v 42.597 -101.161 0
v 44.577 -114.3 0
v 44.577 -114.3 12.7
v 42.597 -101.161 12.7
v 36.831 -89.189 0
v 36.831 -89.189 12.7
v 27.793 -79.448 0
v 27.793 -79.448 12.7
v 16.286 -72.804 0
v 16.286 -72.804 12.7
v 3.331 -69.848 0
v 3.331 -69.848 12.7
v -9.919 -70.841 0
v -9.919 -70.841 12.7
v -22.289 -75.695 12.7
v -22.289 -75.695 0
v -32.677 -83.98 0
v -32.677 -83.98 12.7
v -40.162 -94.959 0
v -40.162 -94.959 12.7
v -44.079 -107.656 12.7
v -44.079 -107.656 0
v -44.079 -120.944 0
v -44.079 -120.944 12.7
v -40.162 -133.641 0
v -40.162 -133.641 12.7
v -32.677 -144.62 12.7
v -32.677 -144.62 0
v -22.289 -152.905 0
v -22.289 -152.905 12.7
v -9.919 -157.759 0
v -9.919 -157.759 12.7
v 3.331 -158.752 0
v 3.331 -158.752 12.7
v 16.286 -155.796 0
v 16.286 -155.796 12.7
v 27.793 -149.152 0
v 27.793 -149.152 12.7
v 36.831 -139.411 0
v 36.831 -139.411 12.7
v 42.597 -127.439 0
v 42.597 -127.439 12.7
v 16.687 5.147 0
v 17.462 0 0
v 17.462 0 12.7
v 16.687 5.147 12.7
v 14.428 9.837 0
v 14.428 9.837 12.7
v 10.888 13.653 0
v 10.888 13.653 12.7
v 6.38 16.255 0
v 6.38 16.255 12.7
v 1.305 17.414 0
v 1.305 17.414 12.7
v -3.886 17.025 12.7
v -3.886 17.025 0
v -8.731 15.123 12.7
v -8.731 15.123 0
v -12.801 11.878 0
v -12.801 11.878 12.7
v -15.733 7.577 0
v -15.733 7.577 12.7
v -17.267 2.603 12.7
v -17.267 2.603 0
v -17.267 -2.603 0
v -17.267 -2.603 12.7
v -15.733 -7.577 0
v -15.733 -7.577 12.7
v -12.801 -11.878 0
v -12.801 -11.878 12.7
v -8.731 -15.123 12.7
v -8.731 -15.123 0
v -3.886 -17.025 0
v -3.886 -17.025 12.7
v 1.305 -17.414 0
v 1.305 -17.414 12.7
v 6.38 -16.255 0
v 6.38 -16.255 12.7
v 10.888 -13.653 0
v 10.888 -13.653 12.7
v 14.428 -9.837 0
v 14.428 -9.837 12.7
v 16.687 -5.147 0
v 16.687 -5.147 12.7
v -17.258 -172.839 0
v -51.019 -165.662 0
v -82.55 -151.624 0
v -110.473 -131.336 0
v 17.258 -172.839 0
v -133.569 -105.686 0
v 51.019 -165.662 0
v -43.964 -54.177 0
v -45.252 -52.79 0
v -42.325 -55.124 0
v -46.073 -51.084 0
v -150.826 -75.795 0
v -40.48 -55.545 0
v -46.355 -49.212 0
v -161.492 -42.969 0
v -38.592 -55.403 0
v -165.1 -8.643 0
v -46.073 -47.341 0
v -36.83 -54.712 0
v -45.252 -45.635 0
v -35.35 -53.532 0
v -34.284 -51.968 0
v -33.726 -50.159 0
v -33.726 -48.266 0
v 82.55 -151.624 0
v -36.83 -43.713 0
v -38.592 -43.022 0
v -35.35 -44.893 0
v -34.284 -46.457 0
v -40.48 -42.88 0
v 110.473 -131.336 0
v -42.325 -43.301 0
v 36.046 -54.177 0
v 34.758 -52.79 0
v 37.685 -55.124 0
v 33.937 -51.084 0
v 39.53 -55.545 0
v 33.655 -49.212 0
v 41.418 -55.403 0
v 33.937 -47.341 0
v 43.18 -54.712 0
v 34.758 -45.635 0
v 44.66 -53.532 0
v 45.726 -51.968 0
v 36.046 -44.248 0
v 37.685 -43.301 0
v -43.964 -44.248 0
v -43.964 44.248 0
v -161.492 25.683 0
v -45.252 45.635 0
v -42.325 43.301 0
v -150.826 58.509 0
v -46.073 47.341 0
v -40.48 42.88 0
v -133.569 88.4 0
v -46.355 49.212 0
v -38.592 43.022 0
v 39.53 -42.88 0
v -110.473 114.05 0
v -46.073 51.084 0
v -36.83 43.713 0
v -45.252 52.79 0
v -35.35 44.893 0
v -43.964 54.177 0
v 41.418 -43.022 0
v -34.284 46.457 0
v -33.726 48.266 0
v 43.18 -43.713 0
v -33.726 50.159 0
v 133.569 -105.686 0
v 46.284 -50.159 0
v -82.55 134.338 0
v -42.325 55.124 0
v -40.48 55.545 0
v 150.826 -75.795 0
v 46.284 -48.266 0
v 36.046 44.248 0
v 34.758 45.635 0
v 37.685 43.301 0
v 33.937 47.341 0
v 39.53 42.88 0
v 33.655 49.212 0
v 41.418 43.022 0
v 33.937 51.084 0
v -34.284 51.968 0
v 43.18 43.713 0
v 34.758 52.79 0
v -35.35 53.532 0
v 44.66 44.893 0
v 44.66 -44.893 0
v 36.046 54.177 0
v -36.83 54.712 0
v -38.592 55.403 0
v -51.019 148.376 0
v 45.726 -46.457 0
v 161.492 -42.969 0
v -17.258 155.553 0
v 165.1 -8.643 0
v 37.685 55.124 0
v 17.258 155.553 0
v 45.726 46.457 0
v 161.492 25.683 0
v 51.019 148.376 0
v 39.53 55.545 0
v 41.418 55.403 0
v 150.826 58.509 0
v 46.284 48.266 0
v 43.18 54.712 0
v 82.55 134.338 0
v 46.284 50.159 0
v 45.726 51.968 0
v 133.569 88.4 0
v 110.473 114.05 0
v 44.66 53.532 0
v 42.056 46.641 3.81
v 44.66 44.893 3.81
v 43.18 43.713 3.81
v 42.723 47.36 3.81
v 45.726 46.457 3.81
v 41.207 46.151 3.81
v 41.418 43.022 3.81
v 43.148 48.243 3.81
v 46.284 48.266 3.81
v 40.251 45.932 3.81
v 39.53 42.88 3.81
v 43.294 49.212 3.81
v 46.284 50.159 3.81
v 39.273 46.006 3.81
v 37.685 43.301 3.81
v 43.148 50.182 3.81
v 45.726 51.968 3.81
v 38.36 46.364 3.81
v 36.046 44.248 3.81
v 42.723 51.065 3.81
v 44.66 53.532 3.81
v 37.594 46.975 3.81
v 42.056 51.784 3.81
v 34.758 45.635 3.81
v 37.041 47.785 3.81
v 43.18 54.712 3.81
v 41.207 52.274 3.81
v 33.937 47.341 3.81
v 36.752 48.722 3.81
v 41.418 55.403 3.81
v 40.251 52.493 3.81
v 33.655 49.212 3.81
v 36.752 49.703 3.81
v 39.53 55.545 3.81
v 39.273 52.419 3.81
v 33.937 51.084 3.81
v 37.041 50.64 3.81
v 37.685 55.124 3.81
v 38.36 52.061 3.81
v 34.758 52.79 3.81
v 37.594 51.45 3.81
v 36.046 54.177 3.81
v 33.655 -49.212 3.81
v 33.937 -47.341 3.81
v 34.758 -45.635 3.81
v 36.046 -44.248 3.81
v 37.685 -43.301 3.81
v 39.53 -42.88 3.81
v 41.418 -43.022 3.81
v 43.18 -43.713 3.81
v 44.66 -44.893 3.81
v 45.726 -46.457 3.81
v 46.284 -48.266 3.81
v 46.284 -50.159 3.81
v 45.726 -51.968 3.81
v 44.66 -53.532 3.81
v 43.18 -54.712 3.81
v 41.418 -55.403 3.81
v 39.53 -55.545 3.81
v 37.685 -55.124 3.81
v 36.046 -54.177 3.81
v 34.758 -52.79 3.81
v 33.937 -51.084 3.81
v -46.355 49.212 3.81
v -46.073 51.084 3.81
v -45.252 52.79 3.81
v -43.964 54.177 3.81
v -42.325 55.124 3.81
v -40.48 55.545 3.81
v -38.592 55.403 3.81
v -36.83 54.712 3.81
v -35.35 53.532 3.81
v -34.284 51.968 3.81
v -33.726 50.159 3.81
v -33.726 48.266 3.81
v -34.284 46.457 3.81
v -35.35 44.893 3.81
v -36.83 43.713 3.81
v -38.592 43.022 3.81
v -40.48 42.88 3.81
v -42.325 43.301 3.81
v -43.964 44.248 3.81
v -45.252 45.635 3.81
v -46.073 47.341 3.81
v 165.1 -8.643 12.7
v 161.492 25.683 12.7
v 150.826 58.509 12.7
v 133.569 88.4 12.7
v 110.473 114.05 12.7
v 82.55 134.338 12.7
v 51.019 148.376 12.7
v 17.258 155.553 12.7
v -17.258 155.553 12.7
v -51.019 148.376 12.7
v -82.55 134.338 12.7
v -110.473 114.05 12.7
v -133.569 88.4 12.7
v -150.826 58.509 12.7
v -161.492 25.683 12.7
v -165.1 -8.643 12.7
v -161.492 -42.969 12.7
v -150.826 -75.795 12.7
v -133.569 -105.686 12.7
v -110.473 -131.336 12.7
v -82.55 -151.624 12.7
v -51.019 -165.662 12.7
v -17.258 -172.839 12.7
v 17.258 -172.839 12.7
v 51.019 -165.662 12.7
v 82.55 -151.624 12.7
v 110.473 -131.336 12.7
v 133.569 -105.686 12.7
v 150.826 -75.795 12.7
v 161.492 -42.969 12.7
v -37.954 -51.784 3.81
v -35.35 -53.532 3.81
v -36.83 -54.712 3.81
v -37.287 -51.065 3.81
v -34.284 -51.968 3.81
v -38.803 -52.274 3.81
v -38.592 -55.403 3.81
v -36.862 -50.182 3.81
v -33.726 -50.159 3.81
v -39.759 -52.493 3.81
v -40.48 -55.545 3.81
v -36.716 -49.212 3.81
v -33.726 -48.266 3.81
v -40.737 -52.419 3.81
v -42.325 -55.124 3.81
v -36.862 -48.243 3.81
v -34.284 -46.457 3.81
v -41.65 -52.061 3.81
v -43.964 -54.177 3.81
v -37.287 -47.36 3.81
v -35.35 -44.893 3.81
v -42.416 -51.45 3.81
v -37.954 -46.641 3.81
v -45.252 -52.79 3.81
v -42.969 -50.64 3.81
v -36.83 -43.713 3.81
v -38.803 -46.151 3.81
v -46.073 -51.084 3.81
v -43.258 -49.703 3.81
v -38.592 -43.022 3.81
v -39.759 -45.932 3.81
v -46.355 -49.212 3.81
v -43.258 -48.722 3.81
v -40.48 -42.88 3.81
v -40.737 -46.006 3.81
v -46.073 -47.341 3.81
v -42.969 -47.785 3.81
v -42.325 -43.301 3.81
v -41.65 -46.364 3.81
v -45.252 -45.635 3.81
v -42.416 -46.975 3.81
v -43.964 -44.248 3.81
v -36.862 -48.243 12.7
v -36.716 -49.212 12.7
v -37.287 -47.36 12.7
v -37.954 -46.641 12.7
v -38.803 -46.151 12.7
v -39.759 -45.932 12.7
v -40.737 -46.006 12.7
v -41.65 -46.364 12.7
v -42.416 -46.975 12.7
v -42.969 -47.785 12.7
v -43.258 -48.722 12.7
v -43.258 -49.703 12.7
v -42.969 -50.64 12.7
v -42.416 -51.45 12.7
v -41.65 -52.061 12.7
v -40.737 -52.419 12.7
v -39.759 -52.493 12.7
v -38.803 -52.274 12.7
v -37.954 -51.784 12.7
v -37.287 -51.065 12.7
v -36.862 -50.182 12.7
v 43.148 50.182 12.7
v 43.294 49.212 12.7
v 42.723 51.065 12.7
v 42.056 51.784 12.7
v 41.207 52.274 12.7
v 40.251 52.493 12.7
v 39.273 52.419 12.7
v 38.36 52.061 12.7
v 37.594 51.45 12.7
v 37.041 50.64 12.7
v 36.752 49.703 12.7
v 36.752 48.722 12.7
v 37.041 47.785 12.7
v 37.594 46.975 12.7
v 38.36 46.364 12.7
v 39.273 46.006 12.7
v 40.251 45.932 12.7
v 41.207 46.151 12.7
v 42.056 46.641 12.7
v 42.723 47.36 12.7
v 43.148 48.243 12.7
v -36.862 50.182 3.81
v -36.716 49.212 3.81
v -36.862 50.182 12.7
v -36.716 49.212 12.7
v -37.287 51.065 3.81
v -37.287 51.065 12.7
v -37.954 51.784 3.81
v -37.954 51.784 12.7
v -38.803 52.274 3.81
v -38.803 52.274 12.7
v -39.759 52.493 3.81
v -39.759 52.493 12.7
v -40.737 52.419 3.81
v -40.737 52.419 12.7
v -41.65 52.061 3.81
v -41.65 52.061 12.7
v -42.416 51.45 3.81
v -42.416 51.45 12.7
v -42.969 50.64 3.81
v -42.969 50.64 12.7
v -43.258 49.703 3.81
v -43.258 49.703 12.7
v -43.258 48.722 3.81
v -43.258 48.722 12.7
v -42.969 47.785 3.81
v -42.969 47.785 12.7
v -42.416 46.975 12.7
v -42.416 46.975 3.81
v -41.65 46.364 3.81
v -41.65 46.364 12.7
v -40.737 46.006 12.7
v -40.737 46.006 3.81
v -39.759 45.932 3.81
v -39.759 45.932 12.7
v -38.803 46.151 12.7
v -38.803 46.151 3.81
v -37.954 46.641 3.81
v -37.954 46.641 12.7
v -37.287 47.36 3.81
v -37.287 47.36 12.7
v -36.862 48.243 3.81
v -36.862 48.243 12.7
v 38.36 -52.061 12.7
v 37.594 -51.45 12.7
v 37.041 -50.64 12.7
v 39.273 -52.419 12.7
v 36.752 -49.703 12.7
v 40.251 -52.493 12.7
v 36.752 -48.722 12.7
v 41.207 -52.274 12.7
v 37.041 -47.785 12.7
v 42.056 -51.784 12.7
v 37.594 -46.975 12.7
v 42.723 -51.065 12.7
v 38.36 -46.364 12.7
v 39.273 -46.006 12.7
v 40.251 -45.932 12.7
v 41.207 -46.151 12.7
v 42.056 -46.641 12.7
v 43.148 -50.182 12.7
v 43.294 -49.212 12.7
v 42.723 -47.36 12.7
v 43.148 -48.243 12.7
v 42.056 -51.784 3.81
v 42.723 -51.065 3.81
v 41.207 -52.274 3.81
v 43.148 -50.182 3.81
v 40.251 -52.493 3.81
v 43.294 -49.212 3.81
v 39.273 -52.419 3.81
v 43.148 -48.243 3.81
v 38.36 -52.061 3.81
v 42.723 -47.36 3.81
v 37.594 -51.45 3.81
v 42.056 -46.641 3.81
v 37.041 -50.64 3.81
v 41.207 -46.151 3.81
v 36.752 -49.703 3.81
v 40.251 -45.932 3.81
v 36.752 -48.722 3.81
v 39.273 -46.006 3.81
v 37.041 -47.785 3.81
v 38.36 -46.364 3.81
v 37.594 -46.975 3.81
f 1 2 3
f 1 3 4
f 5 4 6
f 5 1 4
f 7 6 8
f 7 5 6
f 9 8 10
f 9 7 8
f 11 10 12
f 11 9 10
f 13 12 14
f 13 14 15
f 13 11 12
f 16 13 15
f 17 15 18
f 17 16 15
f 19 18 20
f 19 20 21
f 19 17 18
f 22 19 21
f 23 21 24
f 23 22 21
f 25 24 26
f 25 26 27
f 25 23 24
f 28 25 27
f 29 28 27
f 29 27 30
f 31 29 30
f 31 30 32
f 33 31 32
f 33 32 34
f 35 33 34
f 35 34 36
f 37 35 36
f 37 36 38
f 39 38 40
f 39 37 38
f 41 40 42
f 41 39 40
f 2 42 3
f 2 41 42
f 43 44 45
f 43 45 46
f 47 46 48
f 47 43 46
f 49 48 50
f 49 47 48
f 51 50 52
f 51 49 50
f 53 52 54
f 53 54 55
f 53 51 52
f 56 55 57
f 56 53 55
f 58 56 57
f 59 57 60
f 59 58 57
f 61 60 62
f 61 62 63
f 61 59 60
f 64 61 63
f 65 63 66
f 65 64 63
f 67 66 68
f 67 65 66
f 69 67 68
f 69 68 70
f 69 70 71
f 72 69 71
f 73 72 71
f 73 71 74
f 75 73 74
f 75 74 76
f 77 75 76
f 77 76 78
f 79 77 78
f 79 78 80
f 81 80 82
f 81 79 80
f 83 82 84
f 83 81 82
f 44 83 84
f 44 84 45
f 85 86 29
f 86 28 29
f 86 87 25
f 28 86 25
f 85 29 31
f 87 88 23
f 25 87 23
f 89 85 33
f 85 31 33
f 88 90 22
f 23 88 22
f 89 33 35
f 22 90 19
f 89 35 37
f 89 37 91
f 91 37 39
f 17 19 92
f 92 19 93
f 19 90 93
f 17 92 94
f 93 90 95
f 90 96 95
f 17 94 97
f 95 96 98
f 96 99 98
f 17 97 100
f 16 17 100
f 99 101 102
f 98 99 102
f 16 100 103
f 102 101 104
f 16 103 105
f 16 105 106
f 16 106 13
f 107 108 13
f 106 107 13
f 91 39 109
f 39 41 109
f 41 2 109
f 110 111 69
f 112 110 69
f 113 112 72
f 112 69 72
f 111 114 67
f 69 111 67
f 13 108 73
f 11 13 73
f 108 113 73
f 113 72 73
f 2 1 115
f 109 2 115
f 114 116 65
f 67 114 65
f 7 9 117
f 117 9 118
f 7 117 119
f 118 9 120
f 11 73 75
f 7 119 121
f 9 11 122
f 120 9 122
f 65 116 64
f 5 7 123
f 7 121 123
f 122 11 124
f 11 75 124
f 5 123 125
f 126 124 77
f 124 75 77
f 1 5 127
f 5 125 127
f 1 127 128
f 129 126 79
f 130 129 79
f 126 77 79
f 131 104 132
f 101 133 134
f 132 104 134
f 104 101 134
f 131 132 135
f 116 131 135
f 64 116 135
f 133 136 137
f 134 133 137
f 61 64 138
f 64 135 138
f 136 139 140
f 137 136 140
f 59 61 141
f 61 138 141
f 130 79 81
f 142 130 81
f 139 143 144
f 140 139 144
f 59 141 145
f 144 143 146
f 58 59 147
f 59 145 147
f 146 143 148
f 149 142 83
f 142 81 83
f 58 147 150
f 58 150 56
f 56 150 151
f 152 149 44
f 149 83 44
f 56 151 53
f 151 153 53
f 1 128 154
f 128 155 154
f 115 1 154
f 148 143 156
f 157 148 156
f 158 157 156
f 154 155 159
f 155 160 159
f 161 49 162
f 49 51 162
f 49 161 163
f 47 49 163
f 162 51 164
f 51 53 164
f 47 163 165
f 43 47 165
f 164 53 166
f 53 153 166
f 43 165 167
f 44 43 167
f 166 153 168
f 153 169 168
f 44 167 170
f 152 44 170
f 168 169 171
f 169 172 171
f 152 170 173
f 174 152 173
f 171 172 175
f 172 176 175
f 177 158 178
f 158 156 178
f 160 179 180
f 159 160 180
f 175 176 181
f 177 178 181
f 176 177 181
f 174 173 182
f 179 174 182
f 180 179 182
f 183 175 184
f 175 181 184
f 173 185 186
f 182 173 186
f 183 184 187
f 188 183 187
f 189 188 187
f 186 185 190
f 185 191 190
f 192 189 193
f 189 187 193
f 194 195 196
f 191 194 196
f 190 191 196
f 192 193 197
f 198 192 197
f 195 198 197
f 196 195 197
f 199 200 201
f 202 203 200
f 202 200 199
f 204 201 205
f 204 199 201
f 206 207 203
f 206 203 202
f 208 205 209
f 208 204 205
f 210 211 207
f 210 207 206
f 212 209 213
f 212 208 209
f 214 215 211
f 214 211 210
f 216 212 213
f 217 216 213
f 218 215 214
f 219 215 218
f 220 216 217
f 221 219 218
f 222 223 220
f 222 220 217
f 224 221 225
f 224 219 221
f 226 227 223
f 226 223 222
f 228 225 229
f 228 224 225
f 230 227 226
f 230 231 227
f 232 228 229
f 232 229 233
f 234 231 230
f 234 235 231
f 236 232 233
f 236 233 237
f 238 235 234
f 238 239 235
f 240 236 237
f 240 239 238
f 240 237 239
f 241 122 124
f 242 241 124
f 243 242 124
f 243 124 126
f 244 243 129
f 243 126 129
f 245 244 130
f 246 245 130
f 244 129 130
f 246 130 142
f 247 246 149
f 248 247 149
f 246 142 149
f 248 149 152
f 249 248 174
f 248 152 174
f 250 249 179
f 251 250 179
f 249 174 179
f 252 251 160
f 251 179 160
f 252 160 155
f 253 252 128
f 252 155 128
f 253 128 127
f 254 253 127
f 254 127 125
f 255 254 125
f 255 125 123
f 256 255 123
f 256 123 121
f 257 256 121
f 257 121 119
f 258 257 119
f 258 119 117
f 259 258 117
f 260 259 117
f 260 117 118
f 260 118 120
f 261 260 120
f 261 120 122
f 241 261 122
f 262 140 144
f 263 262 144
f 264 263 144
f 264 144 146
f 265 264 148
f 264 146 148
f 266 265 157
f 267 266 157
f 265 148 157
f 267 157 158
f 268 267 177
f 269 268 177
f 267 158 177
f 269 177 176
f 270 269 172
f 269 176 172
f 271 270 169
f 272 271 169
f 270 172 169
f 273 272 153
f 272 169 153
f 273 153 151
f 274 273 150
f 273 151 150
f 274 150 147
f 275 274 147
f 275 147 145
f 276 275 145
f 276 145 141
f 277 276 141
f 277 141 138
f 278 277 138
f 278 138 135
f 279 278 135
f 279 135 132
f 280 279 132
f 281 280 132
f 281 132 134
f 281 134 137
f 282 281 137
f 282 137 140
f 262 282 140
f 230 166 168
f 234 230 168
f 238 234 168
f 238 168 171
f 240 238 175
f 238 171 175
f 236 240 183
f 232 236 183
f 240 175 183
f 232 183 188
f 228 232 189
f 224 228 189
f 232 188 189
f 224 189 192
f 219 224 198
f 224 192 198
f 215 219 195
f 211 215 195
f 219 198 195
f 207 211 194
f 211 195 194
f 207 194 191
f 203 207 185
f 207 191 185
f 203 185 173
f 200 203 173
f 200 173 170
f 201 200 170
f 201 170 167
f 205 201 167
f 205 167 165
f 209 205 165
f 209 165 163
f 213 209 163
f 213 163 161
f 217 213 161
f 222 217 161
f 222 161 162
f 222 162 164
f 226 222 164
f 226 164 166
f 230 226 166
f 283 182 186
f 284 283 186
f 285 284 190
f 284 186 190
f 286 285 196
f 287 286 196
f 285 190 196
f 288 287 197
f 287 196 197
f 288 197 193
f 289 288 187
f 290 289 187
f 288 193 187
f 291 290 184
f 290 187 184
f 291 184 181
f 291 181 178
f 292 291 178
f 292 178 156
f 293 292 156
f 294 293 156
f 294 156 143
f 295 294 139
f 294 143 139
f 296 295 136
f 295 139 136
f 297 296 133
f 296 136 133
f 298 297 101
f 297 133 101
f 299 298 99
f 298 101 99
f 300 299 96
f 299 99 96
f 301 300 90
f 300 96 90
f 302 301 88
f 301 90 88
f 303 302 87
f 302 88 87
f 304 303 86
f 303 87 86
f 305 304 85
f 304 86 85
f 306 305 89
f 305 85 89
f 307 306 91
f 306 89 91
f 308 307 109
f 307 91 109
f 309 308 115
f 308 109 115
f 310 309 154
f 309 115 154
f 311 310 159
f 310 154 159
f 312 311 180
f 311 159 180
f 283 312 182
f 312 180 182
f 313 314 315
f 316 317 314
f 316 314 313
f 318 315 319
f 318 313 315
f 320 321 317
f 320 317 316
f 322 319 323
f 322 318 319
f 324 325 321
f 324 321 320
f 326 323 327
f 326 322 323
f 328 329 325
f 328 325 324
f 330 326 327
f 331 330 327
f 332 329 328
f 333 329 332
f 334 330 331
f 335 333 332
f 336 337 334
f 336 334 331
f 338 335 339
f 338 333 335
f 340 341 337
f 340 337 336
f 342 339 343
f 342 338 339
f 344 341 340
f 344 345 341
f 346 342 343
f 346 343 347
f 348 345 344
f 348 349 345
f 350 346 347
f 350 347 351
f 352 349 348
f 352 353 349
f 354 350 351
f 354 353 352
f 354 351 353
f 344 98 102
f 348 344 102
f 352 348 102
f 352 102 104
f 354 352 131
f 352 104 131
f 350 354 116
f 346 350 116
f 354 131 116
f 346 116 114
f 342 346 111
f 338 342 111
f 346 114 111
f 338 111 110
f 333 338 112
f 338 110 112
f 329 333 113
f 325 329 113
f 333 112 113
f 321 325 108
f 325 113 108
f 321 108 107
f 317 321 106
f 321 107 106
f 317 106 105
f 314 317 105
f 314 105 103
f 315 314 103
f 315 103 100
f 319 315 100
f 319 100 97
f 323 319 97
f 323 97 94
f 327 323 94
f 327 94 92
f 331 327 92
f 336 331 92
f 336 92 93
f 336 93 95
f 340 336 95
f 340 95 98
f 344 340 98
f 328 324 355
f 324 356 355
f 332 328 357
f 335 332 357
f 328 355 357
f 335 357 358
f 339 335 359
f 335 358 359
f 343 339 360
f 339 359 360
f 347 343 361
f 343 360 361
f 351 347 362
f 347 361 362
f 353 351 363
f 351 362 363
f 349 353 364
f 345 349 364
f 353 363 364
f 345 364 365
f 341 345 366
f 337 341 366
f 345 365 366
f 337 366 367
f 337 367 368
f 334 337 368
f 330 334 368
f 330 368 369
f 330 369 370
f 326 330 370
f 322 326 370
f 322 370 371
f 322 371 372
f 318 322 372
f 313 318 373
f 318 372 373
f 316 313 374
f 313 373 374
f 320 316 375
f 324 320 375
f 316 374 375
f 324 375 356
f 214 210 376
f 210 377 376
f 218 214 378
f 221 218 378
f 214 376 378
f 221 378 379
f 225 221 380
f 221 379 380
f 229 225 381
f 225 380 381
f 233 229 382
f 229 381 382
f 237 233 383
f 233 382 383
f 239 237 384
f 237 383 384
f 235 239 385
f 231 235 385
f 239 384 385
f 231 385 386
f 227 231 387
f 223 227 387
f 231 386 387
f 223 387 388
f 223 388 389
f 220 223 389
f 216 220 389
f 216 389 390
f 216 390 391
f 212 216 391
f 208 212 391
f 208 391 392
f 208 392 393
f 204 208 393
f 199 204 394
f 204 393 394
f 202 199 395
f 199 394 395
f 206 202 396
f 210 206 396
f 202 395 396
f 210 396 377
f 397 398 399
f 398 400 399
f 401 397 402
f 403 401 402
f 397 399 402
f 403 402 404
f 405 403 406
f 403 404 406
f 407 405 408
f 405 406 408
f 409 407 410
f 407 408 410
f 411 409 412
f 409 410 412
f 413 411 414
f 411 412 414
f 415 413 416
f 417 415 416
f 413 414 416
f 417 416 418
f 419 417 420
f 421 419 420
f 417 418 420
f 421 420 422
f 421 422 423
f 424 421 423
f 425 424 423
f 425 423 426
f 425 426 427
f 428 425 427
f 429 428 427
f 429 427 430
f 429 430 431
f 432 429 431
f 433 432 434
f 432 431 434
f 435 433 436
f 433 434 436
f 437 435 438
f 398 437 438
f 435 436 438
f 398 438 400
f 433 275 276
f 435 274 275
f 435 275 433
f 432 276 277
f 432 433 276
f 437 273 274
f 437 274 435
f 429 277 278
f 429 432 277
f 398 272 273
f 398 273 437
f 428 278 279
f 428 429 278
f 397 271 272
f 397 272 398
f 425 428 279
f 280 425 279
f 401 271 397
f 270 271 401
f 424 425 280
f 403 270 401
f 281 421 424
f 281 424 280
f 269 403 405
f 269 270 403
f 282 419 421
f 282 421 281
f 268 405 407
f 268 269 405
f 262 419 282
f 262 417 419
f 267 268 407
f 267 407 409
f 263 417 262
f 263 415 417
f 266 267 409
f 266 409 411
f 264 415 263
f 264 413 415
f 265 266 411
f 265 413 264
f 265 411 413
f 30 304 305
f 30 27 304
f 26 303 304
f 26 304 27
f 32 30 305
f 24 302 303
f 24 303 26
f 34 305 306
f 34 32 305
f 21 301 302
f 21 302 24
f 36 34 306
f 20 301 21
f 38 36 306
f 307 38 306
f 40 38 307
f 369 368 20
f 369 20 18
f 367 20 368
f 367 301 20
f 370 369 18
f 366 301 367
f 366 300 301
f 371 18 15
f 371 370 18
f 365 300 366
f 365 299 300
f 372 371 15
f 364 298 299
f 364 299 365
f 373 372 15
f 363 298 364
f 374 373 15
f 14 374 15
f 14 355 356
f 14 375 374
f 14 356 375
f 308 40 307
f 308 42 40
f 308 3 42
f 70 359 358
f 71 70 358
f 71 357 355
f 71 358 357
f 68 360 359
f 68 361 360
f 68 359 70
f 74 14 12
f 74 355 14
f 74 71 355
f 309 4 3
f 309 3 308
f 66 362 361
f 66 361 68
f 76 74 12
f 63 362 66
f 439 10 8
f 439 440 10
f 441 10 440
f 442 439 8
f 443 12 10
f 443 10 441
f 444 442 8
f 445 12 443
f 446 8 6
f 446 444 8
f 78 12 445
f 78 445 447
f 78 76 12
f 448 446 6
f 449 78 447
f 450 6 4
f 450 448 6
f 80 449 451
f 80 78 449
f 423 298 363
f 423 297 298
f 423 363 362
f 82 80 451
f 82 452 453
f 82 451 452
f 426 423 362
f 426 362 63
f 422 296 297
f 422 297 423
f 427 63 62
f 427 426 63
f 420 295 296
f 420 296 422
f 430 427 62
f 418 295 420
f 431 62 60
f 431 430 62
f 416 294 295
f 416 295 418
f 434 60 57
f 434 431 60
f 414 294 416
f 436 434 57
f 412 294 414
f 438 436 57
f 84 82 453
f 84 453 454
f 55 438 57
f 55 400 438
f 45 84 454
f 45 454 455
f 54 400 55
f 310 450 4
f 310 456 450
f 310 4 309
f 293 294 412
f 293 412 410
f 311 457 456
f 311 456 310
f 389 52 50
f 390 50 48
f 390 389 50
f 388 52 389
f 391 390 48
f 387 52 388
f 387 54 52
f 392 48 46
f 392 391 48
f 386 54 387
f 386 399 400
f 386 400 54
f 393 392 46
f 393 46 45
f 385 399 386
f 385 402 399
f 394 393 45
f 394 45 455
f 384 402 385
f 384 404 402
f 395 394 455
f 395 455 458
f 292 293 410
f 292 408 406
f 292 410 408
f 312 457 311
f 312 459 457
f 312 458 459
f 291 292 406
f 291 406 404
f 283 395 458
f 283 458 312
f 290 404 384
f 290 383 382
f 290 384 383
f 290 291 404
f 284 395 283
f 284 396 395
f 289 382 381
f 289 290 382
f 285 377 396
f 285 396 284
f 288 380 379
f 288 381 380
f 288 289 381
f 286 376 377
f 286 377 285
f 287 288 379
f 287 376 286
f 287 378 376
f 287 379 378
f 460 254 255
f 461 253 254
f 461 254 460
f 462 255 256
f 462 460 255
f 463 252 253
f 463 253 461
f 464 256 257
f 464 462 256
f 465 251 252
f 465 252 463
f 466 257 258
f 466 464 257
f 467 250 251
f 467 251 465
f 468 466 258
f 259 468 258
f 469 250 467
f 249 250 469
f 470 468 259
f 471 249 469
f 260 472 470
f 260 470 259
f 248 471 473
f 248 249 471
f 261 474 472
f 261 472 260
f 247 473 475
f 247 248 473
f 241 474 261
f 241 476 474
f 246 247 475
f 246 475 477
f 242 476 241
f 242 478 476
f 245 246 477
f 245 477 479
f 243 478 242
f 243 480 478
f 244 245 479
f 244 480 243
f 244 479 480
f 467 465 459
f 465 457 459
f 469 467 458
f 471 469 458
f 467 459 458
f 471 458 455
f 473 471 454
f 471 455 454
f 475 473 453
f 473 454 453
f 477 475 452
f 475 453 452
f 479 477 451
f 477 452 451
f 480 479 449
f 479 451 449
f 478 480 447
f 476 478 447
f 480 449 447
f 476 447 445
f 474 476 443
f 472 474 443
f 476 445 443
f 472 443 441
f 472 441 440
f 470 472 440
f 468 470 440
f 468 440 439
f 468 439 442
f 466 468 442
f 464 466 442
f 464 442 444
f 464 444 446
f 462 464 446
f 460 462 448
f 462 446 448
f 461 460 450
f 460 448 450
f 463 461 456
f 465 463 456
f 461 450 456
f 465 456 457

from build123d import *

# Parameters (mm, degrees)
SKETCH1_R                                = 165.1
SKETCH1_R_2                              = 44.577
SKETCH1_R_3                              = 17.4625
BOSS_EXTRUDE1_DEPTH                      = 12.7
CBORE_FOR_1_4_HEX_HEAD_BOLT1_D           = 6.5786
CBORE_FOR_1_4_HEX_HEAD_BOLT1_CBORE_D     = 12.7
CBORE_FOR_1_4_HEX_HEAD_BOLT1_CBORE_DEPTH = 3.81


with BuildPart() as part:
    # Sketch1 → Boss-Extrude1 (new body)
    with BuildSketch(Plane.XY):
        with Locations((0, -8.643025507)):
            Circle(SKETCH1_R)
        with Locations((0, -114.3)):
            Circle(SKETCH1_R_2, mode=Mode.SUBTRACT)
        Circle(SKETCH1_R_3, mode=Mode.SUBTRACT)
    extrude(amount=BOSS_EXTRUDE1_DEPTH)

    # CBORE for 1/4 Hex Head Bolt1 (through all)
    with Locations(Plane(origin=(0, 0, 0), x_dir=(-1, 0, 0), z_dir=(0, 0, -1))):
        with Locations((-40.005, 49.2125), (40.005, 49.2125), (40.005, -49.2125), (-40.005, -49.2125)):
            CounterBoreHole(CBORE_FOR_1_4_HEX_HEAD_BOLT1_D / 2, CBORE_FOR_1_4_HEX_HEAD_BOLT1_CBORE_D / 2, CBORE_FOR_1_4_HEX_HEAD_BOLT1_CBORE_DEPTH)


solid = part.part
